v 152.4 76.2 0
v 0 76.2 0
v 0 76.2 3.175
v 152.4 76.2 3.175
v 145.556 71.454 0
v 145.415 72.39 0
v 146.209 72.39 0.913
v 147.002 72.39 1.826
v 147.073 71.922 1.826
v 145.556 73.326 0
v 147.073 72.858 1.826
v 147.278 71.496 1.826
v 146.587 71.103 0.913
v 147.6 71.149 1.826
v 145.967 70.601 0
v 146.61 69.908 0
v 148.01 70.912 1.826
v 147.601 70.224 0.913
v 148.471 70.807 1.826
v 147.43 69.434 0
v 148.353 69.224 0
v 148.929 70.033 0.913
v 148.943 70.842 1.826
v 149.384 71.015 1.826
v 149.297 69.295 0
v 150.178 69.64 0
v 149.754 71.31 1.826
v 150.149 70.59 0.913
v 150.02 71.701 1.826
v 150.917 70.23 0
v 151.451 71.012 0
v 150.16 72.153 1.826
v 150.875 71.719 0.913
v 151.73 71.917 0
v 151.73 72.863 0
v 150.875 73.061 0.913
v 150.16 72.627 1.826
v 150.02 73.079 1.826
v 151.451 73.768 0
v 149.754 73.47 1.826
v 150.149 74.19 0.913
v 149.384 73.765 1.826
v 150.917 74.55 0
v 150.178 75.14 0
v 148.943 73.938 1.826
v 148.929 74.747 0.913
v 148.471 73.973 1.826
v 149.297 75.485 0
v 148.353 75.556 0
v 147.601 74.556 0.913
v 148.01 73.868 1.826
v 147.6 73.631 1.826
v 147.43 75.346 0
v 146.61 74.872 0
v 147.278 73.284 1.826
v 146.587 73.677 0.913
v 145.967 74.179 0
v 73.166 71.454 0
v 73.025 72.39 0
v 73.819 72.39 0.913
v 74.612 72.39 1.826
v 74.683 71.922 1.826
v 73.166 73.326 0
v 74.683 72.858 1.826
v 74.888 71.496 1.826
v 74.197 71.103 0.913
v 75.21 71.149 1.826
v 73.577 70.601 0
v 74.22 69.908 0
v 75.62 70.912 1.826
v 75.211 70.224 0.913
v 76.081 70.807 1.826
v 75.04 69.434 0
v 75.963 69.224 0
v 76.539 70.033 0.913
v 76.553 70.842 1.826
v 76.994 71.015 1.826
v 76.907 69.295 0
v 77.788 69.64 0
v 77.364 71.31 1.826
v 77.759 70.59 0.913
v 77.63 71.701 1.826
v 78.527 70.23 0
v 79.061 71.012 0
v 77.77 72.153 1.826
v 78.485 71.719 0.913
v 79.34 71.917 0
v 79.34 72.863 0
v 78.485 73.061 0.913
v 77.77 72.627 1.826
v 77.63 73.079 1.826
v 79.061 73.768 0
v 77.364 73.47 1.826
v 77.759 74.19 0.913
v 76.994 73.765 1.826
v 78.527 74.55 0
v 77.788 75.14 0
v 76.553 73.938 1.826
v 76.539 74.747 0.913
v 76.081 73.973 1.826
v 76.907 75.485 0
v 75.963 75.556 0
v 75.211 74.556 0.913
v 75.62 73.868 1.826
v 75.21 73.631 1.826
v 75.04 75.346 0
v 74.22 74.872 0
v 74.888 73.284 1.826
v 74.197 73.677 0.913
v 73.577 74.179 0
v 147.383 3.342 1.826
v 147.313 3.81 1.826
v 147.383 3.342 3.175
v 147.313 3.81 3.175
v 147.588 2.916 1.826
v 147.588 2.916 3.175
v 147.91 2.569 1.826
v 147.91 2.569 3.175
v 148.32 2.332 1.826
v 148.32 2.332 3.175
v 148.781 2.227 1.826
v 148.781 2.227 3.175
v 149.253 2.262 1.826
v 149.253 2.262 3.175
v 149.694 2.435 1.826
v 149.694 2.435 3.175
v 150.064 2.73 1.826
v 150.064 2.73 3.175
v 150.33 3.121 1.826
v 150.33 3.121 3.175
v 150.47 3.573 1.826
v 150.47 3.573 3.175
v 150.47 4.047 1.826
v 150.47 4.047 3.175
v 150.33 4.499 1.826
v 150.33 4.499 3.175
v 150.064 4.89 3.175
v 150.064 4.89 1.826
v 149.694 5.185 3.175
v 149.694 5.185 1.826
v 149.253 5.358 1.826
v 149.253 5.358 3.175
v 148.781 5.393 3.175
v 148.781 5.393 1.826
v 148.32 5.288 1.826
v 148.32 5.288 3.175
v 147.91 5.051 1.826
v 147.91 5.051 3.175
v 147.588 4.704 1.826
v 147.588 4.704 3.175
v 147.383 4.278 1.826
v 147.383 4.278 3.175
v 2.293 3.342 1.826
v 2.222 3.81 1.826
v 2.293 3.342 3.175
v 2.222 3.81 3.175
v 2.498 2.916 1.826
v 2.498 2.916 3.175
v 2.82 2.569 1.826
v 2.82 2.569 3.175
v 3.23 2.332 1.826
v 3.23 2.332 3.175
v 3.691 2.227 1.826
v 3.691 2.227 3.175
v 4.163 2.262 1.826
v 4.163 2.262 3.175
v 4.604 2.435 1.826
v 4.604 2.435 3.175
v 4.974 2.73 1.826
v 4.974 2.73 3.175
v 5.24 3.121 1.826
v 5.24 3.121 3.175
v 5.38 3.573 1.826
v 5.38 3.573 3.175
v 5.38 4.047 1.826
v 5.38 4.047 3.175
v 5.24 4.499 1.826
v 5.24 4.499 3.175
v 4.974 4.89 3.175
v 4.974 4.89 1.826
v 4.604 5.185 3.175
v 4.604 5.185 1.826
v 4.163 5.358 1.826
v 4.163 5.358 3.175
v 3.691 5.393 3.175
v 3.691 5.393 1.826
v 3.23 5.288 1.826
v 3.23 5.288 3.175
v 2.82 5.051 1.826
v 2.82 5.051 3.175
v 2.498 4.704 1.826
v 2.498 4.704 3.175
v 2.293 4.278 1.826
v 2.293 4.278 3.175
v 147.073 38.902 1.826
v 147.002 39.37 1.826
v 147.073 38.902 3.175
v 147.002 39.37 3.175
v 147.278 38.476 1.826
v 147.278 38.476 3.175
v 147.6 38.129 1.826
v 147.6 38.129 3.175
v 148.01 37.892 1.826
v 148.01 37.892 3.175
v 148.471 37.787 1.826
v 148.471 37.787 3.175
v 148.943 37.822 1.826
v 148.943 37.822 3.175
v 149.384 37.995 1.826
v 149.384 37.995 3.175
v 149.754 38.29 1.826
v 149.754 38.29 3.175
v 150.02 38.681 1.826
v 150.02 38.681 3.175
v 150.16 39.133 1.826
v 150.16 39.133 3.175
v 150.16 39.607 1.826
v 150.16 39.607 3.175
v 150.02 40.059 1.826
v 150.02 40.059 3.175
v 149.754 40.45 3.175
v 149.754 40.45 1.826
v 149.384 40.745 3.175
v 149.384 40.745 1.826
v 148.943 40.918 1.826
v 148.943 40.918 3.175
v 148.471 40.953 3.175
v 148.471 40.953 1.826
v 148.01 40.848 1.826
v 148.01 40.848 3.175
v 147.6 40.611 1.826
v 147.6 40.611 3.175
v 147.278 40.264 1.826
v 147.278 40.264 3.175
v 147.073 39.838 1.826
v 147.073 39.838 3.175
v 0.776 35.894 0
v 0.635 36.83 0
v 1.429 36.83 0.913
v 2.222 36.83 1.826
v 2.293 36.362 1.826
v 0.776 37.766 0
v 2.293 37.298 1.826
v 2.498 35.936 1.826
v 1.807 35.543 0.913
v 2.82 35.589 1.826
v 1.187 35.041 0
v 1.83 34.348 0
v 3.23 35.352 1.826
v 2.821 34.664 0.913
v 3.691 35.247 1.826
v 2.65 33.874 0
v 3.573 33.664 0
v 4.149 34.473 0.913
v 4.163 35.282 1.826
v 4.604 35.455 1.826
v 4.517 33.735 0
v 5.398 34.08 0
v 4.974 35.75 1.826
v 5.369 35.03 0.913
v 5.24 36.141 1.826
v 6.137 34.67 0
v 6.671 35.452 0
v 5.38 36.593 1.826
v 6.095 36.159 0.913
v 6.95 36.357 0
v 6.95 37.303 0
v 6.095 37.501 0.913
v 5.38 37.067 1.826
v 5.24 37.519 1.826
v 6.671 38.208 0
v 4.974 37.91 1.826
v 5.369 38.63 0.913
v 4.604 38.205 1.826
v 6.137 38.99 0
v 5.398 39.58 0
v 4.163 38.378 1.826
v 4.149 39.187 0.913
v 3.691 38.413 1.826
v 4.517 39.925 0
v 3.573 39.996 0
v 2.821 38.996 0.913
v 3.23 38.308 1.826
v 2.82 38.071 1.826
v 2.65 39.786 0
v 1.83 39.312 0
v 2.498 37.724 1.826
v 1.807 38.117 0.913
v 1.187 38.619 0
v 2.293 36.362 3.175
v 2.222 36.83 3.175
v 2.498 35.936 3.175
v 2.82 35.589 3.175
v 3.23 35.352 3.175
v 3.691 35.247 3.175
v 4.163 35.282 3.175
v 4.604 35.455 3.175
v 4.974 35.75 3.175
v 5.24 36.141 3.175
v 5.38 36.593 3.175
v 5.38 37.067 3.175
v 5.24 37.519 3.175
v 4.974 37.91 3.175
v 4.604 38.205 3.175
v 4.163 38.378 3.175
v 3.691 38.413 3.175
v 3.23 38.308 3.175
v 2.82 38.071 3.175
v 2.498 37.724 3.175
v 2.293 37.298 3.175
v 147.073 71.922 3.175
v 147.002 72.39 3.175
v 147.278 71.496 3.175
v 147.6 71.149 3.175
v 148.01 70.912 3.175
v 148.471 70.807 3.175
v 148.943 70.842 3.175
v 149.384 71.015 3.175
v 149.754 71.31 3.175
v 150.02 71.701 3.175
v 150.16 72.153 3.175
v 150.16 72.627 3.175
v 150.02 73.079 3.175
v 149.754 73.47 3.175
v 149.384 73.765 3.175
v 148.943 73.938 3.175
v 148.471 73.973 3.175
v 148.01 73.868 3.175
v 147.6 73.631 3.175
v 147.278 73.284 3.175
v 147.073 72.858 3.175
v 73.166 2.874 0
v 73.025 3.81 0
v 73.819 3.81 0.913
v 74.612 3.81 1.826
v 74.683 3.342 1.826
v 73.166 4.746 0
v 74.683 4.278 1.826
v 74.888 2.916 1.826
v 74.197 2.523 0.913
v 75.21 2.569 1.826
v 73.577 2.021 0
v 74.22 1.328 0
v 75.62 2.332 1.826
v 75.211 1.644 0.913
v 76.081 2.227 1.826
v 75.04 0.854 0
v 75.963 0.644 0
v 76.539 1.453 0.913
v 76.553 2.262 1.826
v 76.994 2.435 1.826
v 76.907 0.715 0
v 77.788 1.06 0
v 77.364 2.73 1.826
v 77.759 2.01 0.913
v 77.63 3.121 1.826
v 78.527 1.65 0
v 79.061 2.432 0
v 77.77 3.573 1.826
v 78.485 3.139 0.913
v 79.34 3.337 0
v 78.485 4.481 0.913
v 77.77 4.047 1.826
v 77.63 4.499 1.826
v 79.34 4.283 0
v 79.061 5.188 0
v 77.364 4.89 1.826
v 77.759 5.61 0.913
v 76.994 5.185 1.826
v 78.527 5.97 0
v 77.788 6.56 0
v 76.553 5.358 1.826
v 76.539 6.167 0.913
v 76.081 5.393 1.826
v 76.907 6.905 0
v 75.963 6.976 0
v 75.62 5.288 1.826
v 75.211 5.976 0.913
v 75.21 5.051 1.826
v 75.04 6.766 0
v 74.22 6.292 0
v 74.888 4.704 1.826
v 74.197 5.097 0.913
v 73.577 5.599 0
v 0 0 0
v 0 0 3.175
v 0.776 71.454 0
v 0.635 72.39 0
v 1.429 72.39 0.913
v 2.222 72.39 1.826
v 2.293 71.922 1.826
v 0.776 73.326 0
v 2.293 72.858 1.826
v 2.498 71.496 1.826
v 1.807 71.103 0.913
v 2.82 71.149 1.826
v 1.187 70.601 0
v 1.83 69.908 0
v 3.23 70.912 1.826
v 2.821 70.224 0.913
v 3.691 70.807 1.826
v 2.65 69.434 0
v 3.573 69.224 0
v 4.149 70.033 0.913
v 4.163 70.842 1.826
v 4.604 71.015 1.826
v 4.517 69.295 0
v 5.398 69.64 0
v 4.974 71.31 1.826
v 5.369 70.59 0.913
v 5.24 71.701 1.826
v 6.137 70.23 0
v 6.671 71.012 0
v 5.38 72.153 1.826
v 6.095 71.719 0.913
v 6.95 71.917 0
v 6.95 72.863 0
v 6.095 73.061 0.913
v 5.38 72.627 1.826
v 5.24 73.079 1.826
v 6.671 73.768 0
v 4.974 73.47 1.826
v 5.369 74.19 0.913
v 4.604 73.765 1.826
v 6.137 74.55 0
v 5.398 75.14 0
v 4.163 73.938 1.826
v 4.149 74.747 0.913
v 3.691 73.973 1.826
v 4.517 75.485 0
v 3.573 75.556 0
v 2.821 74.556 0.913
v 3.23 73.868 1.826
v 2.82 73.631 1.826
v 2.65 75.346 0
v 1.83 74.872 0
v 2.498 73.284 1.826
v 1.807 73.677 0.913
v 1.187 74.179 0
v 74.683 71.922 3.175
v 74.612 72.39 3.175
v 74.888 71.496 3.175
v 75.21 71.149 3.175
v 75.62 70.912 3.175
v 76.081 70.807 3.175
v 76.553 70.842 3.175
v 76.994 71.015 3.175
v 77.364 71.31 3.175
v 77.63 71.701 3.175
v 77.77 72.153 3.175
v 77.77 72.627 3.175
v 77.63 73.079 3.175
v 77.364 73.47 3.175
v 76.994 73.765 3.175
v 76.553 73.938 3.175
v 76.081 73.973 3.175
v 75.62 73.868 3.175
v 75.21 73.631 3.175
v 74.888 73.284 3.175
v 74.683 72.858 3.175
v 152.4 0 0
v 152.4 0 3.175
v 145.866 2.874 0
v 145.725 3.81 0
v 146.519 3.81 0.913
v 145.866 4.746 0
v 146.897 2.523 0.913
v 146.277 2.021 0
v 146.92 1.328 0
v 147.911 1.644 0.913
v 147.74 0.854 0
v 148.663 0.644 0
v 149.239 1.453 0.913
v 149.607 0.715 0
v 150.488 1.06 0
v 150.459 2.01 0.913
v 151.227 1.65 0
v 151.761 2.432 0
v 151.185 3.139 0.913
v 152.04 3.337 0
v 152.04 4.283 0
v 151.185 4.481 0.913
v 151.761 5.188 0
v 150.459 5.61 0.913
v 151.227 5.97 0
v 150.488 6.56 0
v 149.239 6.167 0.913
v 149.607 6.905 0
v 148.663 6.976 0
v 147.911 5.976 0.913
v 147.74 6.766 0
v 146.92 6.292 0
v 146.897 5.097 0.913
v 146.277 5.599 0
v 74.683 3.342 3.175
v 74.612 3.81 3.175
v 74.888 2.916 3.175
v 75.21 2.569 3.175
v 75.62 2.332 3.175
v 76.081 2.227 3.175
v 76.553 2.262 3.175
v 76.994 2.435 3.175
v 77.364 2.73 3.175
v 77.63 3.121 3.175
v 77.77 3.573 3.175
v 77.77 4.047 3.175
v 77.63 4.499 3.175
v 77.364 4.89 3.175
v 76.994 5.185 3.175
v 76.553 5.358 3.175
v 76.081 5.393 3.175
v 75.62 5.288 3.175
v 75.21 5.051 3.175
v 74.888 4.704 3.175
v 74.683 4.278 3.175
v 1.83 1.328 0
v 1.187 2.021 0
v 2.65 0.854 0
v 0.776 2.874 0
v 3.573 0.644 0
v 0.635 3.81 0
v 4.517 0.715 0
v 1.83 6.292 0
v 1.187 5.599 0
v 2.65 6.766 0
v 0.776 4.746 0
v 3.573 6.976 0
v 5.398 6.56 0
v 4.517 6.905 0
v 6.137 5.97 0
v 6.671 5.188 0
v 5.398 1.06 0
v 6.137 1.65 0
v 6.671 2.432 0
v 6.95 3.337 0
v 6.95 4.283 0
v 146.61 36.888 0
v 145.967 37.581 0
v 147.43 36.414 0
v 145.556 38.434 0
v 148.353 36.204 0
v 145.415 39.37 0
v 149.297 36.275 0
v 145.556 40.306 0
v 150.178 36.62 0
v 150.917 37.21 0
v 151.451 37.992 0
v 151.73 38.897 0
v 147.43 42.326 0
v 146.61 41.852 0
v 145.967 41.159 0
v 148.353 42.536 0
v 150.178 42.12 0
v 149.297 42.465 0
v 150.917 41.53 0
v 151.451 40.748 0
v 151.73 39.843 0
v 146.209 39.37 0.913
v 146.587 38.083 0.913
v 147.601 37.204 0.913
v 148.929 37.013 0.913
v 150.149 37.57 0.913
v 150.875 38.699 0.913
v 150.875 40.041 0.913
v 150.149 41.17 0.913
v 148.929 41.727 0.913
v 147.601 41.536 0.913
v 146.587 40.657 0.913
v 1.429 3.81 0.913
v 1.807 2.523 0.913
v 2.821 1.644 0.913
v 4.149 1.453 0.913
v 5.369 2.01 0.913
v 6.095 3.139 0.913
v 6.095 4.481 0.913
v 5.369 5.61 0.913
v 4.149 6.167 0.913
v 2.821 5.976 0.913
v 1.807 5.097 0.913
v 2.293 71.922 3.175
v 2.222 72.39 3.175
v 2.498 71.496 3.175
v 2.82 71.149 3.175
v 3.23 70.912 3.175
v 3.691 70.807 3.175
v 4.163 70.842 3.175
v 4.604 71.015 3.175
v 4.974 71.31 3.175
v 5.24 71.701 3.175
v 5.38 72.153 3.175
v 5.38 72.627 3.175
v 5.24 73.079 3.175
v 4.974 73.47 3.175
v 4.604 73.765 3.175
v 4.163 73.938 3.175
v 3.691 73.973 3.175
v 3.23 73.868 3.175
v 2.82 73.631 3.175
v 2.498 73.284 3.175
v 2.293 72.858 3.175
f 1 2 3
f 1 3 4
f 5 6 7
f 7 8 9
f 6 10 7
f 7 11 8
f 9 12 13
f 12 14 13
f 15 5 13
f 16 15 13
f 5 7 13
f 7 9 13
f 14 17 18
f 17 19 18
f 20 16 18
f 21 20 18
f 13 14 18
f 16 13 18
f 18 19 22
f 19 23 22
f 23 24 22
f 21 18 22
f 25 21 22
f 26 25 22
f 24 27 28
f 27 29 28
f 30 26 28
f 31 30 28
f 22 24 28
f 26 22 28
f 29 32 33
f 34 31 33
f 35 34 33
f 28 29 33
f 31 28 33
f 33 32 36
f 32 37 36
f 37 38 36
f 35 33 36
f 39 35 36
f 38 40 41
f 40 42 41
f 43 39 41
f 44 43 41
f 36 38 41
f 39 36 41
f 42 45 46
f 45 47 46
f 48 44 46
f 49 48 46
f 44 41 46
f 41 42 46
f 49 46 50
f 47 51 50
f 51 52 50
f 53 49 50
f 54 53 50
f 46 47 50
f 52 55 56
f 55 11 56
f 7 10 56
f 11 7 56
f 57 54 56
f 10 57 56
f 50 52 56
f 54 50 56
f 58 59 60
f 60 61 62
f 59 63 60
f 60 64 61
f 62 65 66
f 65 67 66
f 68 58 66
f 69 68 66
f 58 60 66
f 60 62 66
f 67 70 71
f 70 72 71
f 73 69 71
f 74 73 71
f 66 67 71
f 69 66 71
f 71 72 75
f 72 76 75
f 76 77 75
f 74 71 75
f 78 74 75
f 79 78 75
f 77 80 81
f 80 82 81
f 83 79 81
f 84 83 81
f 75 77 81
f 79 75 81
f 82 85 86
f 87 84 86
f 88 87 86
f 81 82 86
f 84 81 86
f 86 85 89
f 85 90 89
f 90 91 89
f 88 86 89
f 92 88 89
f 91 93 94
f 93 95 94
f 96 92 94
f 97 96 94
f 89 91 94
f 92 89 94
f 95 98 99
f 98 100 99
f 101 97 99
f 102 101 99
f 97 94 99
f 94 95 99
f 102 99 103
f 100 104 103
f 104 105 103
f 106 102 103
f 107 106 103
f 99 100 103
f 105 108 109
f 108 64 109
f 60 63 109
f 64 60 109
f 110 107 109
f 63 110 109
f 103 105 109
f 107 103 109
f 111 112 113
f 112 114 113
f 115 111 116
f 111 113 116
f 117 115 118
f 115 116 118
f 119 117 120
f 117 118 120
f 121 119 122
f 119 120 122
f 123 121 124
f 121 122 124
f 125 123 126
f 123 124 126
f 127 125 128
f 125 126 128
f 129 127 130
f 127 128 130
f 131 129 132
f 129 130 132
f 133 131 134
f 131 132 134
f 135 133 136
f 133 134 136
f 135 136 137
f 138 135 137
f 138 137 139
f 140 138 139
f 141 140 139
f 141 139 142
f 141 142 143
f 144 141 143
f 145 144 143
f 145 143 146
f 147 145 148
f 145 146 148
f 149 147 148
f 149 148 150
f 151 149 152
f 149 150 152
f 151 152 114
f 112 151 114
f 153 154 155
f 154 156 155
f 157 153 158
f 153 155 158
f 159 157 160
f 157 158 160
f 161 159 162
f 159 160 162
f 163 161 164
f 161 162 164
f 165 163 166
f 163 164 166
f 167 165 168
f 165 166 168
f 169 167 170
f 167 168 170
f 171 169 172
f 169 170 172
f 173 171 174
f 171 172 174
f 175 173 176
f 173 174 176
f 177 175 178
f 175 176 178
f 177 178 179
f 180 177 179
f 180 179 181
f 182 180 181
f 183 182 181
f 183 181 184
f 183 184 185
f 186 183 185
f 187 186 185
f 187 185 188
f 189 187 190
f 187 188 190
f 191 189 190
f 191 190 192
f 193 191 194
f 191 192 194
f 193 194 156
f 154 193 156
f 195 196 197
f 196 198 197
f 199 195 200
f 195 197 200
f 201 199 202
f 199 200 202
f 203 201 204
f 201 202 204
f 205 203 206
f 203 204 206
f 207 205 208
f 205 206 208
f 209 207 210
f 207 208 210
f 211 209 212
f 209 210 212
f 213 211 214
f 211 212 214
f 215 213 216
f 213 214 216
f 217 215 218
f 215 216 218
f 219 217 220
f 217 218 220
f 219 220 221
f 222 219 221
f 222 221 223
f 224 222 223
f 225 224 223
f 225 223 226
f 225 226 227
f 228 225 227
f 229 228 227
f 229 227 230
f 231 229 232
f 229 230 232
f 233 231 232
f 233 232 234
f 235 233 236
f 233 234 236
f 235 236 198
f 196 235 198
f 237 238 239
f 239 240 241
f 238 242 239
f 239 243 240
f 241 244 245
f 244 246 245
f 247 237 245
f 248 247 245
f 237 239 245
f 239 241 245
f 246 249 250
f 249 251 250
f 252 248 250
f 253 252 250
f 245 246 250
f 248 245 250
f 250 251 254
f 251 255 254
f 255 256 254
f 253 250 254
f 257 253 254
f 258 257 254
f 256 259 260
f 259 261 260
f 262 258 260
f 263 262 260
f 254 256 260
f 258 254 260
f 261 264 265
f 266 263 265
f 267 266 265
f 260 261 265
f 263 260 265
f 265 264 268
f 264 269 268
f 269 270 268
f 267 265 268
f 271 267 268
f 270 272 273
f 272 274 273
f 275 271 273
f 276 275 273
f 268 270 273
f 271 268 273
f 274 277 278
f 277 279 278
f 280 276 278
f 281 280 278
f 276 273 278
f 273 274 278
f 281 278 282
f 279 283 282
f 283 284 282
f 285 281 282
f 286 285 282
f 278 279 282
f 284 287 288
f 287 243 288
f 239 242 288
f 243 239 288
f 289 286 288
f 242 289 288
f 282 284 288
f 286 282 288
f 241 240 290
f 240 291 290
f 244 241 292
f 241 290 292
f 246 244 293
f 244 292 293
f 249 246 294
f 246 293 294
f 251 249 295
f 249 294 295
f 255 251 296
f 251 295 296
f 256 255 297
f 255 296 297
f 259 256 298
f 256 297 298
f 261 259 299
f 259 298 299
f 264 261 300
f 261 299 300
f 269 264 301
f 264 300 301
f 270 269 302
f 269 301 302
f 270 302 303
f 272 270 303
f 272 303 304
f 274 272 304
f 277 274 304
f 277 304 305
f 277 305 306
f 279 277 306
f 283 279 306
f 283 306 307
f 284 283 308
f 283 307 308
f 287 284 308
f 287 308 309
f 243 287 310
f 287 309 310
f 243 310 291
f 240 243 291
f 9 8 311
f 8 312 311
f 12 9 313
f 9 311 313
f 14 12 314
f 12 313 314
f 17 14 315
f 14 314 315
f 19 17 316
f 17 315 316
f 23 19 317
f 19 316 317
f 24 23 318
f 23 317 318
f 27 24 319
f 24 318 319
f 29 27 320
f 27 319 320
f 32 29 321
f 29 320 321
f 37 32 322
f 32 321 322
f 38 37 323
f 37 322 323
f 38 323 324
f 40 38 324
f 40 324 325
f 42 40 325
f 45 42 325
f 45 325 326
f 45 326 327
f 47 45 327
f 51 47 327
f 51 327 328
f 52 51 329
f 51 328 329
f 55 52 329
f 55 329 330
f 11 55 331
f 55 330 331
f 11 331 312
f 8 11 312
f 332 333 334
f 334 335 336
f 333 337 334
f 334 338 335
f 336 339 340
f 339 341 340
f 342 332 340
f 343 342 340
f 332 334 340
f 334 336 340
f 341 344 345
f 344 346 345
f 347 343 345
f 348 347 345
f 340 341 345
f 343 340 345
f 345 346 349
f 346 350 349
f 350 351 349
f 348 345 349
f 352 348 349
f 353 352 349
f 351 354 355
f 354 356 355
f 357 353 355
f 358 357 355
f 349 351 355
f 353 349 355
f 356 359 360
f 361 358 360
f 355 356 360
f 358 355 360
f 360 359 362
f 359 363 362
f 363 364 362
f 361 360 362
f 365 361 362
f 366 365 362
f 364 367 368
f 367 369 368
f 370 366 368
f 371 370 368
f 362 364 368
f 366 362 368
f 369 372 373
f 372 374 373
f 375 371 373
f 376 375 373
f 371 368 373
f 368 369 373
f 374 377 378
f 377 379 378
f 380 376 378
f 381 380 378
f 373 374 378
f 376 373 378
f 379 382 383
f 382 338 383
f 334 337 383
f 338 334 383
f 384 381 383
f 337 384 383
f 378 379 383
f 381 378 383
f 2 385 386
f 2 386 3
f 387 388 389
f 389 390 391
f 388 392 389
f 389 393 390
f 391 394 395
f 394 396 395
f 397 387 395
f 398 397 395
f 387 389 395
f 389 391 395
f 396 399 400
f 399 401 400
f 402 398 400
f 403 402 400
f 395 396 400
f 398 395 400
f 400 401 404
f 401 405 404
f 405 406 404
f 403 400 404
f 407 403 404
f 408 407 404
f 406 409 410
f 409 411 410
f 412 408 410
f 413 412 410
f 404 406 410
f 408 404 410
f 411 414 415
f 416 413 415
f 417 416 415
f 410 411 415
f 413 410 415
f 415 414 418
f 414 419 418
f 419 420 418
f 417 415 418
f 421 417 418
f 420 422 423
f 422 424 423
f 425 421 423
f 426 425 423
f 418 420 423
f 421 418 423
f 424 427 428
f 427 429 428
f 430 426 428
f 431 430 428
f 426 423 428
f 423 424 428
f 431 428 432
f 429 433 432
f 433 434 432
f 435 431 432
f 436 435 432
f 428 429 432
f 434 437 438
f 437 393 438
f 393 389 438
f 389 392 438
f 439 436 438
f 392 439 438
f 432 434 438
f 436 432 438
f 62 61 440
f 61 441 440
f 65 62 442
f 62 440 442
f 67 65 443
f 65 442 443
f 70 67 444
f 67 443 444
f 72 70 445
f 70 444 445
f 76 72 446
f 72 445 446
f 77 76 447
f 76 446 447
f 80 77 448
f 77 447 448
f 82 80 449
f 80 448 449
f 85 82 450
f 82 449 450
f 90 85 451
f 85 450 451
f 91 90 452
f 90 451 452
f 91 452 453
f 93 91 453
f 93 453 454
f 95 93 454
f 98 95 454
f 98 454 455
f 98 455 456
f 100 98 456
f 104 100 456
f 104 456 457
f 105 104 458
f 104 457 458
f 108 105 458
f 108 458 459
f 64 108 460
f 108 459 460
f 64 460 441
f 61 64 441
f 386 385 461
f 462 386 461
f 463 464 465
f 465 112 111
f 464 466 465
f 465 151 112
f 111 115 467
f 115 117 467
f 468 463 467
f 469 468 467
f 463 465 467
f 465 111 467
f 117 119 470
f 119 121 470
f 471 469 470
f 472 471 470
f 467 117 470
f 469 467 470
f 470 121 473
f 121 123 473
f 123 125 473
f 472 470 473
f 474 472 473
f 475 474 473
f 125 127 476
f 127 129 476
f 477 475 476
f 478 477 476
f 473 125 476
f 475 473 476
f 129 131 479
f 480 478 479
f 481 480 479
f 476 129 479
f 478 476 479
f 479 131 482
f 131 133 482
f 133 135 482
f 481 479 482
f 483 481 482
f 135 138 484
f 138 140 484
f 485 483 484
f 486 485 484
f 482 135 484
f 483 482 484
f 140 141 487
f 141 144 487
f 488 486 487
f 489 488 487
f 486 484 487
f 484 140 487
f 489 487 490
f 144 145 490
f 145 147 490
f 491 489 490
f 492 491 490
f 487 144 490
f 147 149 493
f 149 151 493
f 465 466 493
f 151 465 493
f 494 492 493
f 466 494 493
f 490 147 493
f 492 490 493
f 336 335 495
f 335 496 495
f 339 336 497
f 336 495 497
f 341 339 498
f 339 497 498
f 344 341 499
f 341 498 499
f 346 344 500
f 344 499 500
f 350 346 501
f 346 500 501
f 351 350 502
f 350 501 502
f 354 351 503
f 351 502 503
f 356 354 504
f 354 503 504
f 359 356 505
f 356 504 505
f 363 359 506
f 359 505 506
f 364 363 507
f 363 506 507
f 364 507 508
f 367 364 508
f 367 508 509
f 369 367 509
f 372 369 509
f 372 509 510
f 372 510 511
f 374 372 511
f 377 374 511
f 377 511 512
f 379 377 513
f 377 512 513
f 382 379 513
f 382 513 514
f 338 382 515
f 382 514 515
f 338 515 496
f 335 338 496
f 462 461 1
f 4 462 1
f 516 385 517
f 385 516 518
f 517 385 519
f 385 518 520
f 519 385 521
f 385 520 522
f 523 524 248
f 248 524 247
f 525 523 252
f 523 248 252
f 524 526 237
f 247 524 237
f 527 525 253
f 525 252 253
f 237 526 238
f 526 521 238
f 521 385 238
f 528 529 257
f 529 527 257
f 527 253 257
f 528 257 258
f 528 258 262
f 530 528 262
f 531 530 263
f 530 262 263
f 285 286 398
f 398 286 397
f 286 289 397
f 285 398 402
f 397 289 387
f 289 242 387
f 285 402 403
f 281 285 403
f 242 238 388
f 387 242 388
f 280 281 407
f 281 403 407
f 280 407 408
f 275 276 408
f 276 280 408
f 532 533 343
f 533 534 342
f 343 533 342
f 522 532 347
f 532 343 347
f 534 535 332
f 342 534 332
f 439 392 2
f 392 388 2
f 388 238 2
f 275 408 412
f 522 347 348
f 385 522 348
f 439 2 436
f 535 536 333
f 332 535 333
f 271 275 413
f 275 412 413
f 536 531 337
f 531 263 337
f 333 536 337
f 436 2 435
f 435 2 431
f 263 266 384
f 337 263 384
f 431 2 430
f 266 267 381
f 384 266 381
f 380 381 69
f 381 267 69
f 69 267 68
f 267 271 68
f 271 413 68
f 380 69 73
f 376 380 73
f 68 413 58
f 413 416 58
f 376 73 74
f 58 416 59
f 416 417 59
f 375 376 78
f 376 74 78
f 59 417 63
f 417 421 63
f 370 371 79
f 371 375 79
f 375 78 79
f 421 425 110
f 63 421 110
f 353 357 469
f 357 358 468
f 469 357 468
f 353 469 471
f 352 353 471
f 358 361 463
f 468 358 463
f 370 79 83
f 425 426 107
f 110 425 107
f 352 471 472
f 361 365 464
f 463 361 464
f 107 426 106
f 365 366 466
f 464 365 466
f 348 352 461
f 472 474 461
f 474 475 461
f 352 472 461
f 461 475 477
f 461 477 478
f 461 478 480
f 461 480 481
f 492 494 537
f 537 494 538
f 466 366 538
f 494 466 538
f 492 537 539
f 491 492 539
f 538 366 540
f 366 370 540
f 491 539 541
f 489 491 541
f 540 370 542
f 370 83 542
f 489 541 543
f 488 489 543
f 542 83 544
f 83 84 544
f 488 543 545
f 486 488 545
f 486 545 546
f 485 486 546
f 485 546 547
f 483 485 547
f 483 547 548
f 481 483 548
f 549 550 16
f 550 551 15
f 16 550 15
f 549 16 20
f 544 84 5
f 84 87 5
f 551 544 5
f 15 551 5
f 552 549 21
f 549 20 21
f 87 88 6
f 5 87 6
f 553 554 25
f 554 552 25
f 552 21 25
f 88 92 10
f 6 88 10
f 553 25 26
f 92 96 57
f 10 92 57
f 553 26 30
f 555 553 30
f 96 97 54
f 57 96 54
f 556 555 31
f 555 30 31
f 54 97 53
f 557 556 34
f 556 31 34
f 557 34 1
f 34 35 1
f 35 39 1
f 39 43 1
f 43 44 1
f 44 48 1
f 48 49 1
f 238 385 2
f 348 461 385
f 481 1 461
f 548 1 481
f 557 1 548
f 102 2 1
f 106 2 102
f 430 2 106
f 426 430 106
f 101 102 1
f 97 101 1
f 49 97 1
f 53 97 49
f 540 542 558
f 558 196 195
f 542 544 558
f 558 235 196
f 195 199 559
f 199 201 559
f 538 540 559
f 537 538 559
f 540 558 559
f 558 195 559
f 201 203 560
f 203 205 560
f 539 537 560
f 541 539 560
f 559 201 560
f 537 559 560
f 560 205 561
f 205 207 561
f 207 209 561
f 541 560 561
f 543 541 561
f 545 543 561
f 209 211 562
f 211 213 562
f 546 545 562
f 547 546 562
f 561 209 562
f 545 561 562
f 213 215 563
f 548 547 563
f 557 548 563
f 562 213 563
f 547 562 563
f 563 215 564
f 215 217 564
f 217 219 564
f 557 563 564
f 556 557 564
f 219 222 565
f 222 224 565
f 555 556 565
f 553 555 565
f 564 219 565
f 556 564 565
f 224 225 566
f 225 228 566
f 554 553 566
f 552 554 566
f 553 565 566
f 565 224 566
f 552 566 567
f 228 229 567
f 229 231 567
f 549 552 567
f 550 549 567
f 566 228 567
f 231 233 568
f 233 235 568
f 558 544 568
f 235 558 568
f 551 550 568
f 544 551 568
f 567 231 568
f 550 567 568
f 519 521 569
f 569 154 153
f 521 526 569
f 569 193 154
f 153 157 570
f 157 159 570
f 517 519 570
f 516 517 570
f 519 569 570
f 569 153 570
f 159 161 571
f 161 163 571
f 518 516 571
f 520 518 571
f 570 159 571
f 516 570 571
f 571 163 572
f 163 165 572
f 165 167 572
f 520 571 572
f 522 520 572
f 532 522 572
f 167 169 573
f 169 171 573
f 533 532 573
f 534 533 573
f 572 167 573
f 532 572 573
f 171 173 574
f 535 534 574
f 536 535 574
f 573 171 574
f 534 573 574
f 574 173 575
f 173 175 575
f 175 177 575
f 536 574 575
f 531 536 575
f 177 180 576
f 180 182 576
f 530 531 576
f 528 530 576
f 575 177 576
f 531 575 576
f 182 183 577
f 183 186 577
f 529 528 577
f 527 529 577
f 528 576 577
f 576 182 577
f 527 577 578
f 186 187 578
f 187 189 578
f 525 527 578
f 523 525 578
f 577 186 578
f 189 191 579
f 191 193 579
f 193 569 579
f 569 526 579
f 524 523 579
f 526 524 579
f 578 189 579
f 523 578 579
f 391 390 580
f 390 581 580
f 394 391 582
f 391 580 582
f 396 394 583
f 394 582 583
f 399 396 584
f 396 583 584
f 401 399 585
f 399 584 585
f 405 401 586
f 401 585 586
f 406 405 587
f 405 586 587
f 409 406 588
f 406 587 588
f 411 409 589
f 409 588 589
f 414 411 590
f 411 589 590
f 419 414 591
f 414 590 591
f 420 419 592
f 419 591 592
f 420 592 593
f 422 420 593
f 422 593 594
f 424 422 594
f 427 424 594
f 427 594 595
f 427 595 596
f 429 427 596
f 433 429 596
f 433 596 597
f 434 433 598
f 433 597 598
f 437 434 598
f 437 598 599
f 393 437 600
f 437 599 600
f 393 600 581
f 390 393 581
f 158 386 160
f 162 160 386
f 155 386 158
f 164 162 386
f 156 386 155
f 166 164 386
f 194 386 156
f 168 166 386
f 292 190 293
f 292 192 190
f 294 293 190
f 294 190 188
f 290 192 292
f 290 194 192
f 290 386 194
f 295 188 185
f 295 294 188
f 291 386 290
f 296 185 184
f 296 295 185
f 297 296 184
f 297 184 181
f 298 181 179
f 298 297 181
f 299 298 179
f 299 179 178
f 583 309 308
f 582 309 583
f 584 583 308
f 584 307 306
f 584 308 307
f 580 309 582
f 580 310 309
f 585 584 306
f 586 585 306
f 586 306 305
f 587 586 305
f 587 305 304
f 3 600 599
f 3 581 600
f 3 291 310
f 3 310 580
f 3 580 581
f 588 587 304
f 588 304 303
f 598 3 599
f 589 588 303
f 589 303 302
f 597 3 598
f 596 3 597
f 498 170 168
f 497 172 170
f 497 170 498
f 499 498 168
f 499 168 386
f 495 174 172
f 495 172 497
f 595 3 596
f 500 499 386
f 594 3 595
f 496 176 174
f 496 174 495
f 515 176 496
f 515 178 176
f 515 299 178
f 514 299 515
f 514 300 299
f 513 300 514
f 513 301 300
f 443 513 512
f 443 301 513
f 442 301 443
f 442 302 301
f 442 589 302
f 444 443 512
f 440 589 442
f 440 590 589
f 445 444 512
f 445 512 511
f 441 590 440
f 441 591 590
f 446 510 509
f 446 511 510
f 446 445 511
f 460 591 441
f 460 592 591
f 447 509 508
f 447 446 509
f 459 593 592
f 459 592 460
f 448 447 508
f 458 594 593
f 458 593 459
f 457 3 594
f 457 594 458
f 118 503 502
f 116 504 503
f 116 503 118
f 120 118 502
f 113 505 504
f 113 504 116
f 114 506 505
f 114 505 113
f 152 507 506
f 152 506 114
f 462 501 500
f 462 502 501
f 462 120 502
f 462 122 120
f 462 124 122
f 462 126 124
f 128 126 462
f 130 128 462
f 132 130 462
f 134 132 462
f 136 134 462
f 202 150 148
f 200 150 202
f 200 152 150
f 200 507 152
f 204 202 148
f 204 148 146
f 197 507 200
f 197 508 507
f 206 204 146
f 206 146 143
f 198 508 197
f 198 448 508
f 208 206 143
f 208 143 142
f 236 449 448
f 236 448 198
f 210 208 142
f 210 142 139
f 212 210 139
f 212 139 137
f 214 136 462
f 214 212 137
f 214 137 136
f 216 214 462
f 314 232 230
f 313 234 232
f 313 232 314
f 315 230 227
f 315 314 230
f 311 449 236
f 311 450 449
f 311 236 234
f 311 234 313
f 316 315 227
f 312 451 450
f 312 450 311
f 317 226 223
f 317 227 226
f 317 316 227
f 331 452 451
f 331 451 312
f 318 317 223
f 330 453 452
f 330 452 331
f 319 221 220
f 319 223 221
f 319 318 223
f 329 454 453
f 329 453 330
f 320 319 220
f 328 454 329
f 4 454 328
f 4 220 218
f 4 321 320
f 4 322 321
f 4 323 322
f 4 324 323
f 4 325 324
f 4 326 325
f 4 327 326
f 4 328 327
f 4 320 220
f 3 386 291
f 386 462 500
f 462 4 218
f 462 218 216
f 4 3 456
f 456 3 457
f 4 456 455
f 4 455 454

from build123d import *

# Parameters (mm, degrees)
F0_W           = 152.4
F0_H           = 76.2
F1_DEPTH       = 3.175
F3_D           = 3.175
F3_CSINK_D     = 6.35
F3_CSINK_ANGLE = 82


# Not quite as in the source:
# - a feature names something its author has since deleted; it is built from what else it names


with BuildPart() as f1:
    # F0 (on Top) → F1 (new body)
    with BuildSketch(Plane.XY):
        with Locations((76.2, 38.1)):
            Rectangle(F0_W, F0_H)
    extrude(amount=F1_DEPTH)

    # F3 (through all)
    with Locations(Plane(origin=(0, 0, 0), x_dir=(1, 0, 0), z_dir=(0, 0, -1))):
        with Locations((3.81, -3.81), (3.81, -36.83), (3.81, -72.39), (148.59, -72.39), (148.59, -39.37), (148.59, -457.2), (76.2, -3.81), (76.2, -72.39), (148.9000022411, -3.81)):
            CounterSinkHole(F3_D / 2, F3_CSINK_D / 2, counter_sink_angle=F3_CSINK_ANGLE)


solid = f1.part
